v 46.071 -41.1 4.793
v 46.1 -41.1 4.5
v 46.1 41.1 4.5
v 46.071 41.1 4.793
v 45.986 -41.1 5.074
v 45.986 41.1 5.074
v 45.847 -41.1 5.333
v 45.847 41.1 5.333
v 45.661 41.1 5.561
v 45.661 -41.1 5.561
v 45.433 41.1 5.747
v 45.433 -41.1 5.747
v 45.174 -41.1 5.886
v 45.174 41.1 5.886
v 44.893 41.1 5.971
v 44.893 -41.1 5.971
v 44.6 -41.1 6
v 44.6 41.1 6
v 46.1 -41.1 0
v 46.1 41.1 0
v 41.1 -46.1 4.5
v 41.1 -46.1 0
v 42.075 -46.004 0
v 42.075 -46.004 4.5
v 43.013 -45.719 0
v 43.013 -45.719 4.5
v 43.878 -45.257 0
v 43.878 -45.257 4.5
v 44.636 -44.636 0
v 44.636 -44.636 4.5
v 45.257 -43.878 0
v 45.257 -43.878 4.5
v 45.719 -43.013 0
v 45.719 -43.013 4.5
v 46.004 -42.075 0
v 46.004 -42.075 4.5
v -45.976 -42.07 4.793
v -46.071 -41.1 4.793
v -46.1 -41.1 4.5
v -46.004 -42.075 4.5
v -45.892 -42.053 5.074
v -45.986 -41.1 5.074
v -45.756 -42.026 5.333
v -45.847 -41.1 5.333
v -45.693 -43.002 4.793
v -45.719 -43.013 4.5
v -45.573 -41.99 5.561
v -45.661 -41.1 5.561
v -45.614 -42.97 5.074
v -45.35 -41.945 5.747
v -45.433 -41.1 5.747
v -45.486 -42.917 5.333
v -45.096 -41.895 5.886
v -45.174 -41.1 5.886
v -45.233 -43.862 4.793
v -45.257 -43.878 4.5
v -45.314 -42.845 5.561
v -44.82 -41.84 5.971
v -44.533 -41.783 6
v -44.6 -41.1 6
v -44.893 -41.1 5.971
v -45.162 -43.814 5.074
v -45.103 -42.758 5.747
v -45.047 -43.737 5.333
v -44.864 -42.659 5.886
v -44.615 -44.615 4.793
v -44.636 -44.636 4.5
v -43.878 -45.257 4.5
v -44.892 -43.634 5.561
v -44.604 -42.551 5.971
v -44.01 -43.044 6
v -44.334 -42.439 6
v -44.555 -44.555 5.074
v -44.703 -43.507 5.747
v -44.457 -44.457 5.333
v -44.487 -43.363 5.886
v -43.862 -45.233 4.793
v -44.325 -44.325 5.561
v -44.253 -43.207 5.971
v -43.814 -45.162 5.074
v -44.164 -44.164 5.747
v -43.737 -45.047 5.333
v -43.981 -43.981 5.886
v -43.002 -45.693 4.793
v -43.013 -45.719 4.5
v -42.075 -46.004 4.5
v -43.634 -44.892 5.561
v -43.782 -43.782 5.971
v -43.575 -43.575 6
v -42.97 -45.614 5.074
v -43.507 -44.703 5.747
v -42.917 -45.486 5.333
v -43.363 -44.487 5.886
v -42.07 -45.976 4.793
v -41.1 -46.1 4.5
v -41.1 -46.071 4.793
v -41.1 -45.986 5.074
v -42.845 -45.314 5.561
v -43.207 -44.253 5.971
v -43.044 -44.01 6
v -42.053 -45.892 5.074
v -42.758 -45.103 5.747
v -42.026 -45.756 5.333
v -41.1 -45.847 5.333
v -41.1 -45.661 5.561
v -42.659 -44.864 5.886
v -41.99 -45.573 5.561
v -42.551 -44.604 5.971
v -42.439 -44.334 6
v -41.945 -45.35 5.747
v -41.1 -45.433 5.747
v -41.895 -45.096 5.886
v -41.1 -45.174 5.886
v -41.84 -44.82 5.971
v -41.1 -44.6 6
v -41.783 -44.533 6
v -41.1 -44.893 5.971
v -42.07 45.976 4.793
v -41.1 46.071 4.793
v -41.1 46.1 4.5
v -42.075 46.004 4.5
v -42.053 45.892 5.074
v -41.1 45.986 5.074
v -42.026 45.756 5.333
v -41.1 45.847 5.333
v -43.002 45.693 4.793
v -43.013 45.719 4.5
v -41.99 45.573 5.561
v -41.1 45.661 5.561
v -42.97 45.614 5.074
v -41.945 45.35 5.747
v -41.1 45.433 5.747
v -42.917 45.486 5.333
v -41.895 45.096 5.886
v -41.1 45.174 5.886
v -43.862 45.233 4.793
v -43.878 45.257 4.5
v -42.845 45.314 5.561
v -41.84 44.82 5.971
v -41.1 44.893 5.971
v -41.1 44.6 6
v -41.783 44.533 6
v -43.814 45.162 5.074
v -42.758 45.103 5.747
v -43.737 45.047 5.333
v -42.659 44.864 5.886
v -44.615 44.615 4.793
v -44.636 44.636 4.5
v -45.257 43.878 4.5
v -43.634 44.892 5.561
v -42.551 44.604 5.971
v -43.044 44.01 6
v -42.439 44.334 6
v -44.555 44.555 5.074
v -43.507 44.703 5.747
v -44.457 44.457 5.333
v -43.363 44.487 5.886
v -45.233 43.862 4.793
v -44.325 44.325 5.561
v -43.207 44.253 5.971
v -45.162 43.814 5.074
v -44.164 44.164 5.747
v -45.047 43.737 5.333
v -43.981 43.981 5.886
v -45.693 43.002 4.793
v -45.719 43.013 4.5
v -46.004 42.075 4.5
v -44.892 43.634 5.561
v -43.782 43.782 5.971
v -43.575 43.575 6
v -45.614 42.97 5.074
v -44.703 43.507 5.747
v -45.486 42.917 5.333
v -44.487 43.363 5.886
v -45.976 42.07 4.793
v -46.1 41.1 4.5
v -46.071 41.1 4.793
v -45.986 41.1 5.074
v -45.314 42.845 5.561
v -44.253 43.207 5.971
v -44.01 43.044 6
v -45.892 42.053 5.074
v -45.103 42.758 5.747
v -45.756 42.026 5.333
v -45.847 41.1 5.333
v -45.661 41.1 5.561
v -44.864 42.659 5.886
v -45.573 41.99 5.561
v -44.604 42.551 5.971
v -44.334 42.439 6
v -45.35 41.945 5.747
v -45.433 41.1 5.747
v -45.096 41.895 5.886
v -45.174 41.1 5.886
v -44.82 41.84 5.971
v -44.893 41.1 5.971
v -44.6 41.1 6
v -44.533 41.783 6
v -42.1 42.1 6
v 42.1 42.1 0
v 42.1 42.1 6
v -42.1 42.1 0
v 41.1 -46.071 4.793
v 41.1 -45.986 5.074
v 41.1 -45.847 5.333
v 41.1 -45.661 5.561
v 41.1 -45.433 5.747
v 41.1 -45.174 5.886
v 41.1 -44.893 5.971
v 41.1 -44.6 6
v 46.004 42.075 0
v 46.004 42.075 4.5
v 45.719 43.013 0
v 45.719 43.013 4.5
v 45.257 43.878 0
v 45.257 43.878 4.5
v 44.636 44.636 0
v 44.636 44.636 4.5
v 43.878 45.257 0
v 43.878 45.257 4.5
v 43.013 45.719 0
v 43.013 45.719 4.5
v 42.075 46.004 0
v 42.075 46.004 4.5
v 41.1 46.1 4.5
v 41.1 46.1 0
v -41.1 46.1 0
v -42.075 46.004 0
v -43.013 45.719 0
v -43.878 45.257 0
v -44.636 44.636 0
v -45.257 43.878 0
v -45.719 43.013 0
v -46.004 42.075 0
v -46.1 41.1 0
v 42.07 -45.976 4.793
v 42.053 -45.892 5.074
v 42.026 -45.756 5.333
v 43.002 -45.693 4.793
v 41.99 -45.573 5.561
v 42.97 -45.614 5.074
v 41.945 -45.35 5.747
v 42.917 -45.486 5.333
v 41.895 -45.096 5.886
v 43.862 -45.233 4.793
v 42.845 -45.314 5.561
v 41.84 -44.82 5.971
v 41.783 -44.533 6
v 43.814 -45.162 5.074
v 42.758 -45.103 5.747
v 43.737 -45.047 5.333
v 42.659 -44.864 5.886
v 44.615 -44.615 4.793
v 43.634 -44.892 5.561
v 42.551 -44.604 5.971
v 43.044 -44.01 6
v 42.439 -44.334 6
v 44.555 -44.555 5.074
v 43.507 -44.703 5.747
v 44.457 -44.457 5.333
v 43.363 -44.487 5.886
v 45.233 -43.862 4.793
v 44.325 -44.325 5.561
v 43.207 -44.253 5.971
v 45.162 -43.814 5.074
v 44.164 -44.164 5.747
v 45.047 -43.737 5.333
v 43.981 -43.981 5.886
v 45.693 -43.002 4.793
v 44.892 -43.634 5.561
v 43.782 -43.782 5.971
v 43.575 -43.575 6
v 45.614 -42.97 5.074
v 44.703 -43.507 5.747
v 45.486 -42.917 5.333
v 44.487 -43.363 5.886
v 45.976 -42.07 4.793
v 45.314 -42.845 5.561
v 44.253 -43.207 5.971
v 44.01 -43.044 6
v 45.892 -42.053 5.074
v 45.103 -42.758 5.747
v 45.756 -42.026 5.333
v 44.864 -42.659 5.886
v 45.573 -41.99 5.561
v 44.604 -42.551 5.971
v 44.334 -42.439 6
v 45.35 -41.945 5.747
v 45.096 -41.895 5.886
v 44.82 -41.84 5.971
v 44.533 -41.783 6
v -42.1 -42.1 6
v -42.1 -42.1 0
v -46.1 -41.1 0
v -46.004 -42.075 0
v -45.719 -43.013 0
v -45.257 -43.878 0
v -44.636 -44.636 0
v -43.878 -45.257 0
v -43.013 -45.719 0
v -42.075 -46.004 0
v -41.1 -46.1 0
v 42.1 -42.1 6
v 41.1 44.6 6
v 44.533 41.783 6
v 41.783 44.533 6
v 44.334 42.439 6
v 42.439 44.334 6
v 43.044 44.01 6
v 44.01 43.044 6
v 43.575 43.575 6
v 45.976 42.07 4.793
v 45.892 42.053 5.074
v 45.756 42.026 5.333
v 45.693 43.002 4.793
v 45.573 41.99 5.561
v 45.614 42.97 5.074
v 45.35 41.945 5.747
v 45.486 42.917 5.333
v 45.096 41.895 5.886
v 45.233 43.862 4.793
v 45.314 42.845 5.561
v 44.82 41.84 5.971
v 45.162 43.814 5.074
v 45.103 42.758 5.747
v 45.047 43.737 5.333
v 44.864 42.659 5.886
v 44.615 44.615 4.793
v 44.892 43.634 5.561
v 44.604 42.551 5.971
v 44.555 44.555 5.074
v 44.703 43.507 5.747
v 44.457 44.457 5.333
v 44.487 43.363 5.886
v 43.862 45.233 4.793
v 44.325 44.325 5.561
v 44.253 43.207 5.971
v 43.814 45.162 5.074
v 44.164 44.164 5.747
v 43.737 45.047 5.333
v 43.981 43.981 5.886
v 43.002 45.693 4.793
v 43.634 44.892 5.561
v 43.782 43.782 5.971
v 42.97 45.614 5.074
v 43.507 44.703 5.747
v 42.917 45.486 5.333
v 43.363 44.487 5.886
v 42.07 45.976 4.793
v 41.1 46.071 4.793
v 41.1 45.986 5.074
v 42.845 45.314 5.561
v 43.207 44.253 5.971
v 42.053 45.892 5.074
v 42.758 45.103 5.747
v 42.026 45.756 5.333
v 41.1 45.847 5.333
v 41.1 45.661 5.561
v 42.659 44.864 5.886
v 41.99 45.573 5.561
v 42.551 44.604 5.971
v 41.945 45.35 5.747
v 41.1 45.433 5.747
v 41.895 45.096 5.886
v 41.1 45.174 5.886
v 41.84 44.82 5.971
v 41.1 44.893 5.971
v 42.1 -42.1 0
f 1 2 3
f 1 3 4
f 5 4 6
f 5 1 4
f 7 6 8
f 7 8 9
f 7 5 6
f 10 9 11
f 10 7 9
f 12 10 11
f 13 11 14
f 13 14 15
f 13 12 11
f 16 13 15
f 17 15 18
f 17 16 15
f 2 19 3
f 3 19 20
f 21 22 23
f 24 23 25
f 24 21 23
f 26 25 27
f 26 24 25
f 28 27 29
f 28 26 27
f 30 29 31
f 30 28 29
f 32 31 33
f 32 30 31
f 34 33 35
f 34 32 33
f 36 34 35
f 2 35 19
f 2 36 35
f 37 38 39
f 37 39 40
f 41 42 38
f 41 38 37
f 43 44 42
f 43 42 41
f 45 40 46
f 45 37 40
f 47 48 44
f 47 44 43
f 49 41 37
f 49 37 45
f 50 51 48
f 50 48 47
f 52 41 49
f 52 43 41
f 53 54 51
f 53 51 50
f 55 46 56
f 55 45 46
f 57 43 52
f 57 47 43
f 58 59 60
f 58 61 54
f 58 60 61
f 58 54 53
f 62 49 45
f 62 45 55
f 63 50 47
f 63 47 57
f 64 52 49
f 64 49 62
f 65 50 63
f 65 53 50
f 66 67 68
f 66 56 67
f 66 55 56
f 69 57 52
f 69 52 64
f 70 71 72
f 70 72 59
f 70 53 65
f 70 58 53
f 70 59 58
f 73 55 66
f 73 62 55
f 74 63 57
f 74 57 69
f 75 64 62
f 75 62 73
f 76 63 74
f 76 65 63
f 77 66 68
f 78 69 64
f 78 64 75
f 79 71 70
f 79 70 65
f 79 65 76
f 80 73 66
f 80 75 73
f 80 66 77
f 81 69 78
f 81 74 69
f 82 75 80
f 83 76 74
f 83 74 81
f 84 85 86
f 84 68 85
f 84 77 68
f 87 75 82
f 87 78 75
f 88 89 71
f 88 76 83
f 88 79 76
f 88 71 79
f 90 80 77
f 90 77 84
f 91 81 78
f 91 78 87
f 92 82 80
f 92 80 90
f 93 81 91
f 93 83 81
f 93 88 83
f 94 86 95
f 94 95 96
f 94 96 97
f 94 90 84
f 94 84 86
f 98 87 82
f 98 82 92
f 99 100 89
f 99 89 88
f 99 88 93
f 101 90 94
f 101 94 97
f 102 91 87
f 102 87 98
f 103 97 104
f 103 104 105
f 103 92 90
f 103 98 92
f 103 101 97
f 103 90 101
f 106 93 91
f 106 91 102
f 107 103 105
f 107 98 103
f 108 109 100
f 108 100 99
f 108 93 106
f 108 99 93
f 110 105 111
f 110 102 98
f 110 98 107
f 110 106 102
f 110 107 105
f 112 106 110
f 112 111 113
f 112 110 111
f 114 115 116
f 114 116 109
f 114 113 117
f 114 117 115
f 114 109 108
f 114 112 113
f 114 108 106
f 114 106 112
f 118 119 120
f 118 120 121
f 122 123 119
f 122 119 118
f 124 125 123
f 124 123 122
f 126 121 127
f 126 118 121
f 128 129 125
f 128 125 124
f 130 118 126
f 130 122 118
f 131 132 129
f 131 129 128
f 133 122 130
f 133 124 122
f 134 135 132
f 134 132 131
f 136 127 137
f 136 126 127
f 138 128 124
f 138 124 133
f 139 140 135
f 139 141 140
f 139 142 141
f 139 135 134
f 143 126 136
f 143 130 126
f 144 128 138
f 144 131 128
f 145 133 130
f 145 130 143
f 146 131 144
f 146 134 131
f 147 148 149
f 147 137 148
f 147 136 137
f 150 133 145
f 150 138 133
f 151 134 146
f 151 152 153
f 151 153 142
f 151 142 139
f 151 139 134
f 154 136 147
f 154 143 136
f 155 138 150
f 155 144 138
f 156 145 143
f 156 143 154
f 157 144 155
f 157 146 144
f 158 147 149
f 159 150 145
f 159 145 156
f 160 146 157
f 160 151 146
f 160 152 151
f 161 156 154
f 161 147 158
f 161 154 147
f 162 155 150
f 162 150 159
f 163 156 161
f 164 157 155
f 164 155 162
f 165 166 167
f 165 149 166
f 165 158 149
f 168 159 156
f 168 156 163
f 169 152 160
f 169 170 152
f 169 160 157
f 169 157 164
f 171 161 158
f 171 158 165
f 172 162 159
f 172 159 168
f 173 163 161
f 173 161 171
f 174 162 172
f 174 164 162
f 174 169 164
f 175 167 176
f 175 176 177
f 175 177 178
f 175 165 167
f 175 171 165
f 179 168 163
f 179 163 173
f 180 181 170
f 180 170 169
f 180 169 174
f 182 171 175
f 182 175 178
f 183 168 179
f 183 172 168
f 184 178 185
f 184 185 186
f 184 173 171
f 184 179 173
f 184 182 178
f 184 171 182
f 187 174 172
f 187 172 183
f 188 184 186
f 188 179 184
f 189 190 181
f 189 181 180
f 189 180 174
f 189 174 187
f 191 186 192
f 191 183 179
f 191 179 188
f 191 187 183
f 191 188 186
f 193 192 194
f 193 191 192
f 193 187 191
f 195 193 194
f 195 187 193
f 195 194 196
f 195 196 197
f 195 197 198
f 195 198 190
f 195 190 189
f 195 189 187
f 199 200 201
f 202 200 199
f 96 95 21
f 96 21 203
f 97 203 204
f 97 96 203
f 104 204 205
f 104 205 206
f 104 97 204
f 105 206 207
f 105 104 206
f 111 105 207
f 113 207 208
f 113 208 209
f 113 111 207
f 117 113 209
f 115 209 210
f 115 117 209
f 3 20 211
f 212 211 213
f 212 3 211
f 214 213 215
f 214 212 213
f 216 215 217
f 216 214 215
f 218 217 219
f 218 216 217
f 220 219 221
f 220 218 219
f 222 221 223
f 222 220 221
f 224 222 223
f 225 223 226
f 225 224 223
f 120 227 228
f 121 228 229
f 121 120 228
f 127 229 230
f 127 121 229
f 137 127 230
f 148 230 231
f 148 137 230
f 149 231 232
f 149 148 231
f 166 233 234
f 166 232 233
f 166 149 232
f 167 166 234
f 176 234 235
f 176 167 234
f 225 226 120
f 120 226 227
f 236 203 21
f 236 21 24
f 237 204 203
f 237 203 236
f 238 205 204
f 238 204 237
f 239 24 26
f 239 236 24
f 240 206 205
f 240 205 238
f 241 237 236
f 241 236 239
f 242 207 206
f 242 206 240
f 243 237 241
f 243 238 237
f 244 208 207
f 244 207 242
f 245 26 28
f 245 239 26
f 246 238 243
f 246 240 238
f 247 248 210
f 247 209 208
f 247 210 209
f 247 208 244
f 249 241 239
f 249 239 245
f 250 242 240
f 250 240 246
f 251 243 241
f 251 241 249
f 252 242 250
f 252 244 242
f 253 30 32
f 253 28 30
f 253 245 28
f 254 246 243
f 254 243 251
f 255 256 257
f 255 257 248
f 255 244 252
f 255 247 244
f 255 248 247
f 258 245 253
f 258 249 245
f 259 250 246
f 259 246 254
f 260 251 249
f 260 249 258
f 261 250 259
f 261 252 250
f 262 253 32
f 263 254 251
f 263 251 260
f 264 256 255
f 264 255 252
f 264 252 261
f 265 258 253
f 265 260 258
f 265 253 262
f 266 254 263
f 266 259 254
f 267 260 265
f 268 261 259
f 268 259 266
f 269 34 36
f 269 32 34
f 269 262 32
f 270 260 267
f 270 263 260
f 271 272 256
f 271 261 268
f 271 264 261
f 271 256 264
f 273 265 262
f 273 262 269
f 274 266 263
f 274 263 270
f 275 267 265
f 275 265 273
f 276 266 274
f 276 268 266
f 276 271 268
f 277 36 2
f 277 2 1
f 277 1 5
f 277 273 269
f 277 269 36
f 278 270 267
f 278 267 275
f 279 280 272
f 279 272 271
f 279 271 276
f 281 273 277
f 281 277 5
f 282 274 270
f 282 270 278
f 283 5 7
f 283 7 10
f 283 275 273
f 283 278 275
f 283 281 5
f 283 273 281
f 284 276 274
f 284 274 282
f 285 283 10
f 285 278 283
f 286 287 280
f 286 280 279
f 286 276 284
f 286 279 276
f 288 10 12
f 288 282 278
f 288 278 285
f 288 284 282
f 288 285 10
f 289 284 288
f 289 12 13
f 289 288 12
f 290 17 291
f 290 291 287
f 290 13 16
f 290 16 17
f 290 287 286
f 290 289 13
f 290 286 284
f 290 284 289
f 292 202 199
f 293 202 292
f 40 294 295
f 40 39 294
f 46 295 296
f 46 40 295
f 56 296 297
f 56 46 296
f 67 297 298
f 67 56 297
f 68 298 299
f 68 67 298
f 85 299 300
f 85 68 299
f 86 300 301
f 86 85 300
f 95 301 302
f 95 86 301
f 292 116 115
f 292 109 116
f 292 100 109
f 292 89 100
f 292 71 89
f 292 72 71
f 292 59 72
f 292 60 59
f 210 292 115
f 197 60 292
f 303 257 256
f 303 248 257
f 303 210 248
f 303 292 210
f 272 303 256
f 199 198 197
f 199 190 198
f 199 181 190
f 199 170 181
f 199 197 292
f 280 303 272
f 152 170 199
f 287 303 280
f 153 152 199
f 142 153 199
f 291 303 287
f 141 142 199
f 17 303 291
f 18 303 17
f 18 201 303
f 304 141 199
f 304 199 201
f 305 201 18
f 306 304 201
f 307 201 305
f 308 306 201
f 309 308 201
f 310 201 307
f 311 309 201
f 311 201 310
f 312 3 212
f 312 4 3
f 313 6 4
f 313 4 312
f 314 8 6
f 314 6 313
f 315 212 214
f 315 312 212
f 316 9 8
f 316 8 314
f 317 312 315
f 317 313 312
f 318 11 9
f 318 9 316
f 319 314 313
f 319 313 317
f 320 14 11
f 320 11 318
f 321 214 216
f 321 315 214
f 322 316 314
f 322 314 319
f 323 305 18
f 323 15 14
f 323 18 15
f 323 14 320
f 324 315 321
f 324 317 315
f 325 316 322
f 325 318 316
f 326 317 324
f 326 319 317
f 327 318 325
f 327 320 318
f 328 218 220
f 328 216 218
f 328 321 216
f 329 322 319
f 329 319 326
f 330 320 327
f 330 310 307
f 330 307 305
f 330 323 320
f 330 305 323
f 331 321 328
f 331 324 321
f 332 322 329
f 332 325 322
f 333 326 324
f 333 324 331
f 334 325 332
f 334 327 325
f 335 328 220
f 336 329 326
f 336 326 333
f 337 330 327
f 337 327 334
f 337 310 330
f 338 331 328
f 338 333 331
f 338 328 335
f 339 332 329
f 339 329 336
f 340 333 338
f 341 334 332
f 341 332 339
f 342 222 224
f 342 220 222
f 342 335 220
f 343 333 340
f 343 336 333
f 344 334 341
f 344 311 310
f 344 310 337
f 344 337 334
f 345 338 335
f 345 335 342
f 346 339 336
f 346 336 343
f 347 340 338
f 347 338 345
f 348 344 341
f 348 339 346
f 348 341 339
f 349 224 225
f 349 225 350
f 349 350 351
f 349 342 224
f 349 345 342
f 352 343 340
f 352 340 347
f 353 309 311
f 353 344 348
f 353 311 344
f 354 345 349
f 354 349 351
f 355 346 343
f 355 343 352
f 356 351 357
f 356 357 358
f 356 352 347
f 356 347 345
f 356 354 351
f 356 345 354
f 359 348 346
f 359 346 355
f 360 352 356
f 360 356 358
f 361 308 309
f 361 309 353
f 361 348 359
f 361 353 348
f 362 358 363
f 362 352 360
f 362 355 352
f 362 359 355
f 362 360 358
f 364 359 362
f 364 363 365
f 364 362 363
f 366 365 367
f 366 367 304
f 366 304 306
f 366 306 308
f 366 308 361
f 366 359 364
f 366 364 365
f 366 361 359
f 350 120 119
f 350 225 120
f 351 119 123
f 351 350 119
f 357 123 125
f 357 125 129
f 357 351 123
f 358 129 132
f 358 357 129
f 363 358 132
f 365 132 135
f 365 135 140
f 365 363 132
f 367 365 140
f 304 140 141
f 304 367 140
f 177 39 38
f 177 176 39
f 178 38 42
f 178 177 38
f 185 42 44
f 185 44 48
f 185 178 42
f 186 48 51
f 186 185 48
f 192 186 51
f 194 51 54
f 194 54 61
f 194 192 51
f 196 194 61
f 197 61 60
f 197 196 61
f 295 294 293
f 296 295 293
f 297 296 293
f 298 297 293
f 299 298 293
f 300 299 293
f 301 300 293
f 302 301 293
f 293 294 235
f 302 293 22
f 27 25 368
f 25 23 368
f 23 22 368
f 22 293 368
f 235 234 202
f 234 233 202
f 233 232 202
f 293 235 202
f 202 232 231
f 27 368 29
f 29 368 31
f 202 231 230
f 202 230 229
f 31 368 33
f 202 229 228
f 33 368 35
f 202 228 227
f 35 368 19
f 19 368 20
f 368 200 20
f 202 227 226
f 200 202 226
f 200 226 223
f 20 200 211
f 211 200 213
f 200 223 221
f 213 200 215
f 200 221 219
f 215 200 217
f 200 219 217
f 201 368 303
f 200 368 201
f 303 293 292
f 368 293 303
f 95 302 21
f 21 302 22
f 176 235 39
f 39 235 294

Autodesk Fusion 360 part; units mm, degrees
sketch "Sketch1" plane through (0, 0, 0) normal (0, 0, 1) x (1, 0, 0)
  line L0 (42.1, 42.1) -> (-42.1, 42.1)
  line L1 (-42.1, 42.1) -> (-42.1, -42.1)
  line L2 (-42.1, -42.1) -> (42.1, -42.1)
  line L3 (42.1, -42.1) -> (42.1, 42.1)
  line L4 (42.1, 42.1) -> (-42.1, -42.1) construction
  line L5 (-42.1, 42.1) -> (42.1, -42.1) construction
  line L6 (-46.1, -46.1) -> (46.1, -46.1)
  line L7 (46.1, -46.1) -> (46.1, 46.1)
  line L8 (46.1, 46.1) -> (-46.1, 46.1)
  line L9 (-46.1, 46.1) -> (-46.1, -46.1)
  dimension "d1" = 84.2
  dimension "d2" = 84.2
  dimension "d3" = 4
extrude "Extrude1" add sketch "Sketch1" along normal blind 6
fillet "Fillet1" radius 5 4 edges at (-46.1, -46.1, 3) (46.1, -46.1, 3) (46.1, 46.1, 3) (-46.1, 46.1, 3)
fillet "Fillet2" radius 1.5 8 edges at (-44.6355, 44.6355, 6) (-46.1, 0, 6) (-44.6355, -44.6355, 6) (0, -46.1, 6) (44.6355, -44.6355, 6) (46.1, 0, 6) (44.6355, 44.6355, 6) (0, 46.1, 6)
